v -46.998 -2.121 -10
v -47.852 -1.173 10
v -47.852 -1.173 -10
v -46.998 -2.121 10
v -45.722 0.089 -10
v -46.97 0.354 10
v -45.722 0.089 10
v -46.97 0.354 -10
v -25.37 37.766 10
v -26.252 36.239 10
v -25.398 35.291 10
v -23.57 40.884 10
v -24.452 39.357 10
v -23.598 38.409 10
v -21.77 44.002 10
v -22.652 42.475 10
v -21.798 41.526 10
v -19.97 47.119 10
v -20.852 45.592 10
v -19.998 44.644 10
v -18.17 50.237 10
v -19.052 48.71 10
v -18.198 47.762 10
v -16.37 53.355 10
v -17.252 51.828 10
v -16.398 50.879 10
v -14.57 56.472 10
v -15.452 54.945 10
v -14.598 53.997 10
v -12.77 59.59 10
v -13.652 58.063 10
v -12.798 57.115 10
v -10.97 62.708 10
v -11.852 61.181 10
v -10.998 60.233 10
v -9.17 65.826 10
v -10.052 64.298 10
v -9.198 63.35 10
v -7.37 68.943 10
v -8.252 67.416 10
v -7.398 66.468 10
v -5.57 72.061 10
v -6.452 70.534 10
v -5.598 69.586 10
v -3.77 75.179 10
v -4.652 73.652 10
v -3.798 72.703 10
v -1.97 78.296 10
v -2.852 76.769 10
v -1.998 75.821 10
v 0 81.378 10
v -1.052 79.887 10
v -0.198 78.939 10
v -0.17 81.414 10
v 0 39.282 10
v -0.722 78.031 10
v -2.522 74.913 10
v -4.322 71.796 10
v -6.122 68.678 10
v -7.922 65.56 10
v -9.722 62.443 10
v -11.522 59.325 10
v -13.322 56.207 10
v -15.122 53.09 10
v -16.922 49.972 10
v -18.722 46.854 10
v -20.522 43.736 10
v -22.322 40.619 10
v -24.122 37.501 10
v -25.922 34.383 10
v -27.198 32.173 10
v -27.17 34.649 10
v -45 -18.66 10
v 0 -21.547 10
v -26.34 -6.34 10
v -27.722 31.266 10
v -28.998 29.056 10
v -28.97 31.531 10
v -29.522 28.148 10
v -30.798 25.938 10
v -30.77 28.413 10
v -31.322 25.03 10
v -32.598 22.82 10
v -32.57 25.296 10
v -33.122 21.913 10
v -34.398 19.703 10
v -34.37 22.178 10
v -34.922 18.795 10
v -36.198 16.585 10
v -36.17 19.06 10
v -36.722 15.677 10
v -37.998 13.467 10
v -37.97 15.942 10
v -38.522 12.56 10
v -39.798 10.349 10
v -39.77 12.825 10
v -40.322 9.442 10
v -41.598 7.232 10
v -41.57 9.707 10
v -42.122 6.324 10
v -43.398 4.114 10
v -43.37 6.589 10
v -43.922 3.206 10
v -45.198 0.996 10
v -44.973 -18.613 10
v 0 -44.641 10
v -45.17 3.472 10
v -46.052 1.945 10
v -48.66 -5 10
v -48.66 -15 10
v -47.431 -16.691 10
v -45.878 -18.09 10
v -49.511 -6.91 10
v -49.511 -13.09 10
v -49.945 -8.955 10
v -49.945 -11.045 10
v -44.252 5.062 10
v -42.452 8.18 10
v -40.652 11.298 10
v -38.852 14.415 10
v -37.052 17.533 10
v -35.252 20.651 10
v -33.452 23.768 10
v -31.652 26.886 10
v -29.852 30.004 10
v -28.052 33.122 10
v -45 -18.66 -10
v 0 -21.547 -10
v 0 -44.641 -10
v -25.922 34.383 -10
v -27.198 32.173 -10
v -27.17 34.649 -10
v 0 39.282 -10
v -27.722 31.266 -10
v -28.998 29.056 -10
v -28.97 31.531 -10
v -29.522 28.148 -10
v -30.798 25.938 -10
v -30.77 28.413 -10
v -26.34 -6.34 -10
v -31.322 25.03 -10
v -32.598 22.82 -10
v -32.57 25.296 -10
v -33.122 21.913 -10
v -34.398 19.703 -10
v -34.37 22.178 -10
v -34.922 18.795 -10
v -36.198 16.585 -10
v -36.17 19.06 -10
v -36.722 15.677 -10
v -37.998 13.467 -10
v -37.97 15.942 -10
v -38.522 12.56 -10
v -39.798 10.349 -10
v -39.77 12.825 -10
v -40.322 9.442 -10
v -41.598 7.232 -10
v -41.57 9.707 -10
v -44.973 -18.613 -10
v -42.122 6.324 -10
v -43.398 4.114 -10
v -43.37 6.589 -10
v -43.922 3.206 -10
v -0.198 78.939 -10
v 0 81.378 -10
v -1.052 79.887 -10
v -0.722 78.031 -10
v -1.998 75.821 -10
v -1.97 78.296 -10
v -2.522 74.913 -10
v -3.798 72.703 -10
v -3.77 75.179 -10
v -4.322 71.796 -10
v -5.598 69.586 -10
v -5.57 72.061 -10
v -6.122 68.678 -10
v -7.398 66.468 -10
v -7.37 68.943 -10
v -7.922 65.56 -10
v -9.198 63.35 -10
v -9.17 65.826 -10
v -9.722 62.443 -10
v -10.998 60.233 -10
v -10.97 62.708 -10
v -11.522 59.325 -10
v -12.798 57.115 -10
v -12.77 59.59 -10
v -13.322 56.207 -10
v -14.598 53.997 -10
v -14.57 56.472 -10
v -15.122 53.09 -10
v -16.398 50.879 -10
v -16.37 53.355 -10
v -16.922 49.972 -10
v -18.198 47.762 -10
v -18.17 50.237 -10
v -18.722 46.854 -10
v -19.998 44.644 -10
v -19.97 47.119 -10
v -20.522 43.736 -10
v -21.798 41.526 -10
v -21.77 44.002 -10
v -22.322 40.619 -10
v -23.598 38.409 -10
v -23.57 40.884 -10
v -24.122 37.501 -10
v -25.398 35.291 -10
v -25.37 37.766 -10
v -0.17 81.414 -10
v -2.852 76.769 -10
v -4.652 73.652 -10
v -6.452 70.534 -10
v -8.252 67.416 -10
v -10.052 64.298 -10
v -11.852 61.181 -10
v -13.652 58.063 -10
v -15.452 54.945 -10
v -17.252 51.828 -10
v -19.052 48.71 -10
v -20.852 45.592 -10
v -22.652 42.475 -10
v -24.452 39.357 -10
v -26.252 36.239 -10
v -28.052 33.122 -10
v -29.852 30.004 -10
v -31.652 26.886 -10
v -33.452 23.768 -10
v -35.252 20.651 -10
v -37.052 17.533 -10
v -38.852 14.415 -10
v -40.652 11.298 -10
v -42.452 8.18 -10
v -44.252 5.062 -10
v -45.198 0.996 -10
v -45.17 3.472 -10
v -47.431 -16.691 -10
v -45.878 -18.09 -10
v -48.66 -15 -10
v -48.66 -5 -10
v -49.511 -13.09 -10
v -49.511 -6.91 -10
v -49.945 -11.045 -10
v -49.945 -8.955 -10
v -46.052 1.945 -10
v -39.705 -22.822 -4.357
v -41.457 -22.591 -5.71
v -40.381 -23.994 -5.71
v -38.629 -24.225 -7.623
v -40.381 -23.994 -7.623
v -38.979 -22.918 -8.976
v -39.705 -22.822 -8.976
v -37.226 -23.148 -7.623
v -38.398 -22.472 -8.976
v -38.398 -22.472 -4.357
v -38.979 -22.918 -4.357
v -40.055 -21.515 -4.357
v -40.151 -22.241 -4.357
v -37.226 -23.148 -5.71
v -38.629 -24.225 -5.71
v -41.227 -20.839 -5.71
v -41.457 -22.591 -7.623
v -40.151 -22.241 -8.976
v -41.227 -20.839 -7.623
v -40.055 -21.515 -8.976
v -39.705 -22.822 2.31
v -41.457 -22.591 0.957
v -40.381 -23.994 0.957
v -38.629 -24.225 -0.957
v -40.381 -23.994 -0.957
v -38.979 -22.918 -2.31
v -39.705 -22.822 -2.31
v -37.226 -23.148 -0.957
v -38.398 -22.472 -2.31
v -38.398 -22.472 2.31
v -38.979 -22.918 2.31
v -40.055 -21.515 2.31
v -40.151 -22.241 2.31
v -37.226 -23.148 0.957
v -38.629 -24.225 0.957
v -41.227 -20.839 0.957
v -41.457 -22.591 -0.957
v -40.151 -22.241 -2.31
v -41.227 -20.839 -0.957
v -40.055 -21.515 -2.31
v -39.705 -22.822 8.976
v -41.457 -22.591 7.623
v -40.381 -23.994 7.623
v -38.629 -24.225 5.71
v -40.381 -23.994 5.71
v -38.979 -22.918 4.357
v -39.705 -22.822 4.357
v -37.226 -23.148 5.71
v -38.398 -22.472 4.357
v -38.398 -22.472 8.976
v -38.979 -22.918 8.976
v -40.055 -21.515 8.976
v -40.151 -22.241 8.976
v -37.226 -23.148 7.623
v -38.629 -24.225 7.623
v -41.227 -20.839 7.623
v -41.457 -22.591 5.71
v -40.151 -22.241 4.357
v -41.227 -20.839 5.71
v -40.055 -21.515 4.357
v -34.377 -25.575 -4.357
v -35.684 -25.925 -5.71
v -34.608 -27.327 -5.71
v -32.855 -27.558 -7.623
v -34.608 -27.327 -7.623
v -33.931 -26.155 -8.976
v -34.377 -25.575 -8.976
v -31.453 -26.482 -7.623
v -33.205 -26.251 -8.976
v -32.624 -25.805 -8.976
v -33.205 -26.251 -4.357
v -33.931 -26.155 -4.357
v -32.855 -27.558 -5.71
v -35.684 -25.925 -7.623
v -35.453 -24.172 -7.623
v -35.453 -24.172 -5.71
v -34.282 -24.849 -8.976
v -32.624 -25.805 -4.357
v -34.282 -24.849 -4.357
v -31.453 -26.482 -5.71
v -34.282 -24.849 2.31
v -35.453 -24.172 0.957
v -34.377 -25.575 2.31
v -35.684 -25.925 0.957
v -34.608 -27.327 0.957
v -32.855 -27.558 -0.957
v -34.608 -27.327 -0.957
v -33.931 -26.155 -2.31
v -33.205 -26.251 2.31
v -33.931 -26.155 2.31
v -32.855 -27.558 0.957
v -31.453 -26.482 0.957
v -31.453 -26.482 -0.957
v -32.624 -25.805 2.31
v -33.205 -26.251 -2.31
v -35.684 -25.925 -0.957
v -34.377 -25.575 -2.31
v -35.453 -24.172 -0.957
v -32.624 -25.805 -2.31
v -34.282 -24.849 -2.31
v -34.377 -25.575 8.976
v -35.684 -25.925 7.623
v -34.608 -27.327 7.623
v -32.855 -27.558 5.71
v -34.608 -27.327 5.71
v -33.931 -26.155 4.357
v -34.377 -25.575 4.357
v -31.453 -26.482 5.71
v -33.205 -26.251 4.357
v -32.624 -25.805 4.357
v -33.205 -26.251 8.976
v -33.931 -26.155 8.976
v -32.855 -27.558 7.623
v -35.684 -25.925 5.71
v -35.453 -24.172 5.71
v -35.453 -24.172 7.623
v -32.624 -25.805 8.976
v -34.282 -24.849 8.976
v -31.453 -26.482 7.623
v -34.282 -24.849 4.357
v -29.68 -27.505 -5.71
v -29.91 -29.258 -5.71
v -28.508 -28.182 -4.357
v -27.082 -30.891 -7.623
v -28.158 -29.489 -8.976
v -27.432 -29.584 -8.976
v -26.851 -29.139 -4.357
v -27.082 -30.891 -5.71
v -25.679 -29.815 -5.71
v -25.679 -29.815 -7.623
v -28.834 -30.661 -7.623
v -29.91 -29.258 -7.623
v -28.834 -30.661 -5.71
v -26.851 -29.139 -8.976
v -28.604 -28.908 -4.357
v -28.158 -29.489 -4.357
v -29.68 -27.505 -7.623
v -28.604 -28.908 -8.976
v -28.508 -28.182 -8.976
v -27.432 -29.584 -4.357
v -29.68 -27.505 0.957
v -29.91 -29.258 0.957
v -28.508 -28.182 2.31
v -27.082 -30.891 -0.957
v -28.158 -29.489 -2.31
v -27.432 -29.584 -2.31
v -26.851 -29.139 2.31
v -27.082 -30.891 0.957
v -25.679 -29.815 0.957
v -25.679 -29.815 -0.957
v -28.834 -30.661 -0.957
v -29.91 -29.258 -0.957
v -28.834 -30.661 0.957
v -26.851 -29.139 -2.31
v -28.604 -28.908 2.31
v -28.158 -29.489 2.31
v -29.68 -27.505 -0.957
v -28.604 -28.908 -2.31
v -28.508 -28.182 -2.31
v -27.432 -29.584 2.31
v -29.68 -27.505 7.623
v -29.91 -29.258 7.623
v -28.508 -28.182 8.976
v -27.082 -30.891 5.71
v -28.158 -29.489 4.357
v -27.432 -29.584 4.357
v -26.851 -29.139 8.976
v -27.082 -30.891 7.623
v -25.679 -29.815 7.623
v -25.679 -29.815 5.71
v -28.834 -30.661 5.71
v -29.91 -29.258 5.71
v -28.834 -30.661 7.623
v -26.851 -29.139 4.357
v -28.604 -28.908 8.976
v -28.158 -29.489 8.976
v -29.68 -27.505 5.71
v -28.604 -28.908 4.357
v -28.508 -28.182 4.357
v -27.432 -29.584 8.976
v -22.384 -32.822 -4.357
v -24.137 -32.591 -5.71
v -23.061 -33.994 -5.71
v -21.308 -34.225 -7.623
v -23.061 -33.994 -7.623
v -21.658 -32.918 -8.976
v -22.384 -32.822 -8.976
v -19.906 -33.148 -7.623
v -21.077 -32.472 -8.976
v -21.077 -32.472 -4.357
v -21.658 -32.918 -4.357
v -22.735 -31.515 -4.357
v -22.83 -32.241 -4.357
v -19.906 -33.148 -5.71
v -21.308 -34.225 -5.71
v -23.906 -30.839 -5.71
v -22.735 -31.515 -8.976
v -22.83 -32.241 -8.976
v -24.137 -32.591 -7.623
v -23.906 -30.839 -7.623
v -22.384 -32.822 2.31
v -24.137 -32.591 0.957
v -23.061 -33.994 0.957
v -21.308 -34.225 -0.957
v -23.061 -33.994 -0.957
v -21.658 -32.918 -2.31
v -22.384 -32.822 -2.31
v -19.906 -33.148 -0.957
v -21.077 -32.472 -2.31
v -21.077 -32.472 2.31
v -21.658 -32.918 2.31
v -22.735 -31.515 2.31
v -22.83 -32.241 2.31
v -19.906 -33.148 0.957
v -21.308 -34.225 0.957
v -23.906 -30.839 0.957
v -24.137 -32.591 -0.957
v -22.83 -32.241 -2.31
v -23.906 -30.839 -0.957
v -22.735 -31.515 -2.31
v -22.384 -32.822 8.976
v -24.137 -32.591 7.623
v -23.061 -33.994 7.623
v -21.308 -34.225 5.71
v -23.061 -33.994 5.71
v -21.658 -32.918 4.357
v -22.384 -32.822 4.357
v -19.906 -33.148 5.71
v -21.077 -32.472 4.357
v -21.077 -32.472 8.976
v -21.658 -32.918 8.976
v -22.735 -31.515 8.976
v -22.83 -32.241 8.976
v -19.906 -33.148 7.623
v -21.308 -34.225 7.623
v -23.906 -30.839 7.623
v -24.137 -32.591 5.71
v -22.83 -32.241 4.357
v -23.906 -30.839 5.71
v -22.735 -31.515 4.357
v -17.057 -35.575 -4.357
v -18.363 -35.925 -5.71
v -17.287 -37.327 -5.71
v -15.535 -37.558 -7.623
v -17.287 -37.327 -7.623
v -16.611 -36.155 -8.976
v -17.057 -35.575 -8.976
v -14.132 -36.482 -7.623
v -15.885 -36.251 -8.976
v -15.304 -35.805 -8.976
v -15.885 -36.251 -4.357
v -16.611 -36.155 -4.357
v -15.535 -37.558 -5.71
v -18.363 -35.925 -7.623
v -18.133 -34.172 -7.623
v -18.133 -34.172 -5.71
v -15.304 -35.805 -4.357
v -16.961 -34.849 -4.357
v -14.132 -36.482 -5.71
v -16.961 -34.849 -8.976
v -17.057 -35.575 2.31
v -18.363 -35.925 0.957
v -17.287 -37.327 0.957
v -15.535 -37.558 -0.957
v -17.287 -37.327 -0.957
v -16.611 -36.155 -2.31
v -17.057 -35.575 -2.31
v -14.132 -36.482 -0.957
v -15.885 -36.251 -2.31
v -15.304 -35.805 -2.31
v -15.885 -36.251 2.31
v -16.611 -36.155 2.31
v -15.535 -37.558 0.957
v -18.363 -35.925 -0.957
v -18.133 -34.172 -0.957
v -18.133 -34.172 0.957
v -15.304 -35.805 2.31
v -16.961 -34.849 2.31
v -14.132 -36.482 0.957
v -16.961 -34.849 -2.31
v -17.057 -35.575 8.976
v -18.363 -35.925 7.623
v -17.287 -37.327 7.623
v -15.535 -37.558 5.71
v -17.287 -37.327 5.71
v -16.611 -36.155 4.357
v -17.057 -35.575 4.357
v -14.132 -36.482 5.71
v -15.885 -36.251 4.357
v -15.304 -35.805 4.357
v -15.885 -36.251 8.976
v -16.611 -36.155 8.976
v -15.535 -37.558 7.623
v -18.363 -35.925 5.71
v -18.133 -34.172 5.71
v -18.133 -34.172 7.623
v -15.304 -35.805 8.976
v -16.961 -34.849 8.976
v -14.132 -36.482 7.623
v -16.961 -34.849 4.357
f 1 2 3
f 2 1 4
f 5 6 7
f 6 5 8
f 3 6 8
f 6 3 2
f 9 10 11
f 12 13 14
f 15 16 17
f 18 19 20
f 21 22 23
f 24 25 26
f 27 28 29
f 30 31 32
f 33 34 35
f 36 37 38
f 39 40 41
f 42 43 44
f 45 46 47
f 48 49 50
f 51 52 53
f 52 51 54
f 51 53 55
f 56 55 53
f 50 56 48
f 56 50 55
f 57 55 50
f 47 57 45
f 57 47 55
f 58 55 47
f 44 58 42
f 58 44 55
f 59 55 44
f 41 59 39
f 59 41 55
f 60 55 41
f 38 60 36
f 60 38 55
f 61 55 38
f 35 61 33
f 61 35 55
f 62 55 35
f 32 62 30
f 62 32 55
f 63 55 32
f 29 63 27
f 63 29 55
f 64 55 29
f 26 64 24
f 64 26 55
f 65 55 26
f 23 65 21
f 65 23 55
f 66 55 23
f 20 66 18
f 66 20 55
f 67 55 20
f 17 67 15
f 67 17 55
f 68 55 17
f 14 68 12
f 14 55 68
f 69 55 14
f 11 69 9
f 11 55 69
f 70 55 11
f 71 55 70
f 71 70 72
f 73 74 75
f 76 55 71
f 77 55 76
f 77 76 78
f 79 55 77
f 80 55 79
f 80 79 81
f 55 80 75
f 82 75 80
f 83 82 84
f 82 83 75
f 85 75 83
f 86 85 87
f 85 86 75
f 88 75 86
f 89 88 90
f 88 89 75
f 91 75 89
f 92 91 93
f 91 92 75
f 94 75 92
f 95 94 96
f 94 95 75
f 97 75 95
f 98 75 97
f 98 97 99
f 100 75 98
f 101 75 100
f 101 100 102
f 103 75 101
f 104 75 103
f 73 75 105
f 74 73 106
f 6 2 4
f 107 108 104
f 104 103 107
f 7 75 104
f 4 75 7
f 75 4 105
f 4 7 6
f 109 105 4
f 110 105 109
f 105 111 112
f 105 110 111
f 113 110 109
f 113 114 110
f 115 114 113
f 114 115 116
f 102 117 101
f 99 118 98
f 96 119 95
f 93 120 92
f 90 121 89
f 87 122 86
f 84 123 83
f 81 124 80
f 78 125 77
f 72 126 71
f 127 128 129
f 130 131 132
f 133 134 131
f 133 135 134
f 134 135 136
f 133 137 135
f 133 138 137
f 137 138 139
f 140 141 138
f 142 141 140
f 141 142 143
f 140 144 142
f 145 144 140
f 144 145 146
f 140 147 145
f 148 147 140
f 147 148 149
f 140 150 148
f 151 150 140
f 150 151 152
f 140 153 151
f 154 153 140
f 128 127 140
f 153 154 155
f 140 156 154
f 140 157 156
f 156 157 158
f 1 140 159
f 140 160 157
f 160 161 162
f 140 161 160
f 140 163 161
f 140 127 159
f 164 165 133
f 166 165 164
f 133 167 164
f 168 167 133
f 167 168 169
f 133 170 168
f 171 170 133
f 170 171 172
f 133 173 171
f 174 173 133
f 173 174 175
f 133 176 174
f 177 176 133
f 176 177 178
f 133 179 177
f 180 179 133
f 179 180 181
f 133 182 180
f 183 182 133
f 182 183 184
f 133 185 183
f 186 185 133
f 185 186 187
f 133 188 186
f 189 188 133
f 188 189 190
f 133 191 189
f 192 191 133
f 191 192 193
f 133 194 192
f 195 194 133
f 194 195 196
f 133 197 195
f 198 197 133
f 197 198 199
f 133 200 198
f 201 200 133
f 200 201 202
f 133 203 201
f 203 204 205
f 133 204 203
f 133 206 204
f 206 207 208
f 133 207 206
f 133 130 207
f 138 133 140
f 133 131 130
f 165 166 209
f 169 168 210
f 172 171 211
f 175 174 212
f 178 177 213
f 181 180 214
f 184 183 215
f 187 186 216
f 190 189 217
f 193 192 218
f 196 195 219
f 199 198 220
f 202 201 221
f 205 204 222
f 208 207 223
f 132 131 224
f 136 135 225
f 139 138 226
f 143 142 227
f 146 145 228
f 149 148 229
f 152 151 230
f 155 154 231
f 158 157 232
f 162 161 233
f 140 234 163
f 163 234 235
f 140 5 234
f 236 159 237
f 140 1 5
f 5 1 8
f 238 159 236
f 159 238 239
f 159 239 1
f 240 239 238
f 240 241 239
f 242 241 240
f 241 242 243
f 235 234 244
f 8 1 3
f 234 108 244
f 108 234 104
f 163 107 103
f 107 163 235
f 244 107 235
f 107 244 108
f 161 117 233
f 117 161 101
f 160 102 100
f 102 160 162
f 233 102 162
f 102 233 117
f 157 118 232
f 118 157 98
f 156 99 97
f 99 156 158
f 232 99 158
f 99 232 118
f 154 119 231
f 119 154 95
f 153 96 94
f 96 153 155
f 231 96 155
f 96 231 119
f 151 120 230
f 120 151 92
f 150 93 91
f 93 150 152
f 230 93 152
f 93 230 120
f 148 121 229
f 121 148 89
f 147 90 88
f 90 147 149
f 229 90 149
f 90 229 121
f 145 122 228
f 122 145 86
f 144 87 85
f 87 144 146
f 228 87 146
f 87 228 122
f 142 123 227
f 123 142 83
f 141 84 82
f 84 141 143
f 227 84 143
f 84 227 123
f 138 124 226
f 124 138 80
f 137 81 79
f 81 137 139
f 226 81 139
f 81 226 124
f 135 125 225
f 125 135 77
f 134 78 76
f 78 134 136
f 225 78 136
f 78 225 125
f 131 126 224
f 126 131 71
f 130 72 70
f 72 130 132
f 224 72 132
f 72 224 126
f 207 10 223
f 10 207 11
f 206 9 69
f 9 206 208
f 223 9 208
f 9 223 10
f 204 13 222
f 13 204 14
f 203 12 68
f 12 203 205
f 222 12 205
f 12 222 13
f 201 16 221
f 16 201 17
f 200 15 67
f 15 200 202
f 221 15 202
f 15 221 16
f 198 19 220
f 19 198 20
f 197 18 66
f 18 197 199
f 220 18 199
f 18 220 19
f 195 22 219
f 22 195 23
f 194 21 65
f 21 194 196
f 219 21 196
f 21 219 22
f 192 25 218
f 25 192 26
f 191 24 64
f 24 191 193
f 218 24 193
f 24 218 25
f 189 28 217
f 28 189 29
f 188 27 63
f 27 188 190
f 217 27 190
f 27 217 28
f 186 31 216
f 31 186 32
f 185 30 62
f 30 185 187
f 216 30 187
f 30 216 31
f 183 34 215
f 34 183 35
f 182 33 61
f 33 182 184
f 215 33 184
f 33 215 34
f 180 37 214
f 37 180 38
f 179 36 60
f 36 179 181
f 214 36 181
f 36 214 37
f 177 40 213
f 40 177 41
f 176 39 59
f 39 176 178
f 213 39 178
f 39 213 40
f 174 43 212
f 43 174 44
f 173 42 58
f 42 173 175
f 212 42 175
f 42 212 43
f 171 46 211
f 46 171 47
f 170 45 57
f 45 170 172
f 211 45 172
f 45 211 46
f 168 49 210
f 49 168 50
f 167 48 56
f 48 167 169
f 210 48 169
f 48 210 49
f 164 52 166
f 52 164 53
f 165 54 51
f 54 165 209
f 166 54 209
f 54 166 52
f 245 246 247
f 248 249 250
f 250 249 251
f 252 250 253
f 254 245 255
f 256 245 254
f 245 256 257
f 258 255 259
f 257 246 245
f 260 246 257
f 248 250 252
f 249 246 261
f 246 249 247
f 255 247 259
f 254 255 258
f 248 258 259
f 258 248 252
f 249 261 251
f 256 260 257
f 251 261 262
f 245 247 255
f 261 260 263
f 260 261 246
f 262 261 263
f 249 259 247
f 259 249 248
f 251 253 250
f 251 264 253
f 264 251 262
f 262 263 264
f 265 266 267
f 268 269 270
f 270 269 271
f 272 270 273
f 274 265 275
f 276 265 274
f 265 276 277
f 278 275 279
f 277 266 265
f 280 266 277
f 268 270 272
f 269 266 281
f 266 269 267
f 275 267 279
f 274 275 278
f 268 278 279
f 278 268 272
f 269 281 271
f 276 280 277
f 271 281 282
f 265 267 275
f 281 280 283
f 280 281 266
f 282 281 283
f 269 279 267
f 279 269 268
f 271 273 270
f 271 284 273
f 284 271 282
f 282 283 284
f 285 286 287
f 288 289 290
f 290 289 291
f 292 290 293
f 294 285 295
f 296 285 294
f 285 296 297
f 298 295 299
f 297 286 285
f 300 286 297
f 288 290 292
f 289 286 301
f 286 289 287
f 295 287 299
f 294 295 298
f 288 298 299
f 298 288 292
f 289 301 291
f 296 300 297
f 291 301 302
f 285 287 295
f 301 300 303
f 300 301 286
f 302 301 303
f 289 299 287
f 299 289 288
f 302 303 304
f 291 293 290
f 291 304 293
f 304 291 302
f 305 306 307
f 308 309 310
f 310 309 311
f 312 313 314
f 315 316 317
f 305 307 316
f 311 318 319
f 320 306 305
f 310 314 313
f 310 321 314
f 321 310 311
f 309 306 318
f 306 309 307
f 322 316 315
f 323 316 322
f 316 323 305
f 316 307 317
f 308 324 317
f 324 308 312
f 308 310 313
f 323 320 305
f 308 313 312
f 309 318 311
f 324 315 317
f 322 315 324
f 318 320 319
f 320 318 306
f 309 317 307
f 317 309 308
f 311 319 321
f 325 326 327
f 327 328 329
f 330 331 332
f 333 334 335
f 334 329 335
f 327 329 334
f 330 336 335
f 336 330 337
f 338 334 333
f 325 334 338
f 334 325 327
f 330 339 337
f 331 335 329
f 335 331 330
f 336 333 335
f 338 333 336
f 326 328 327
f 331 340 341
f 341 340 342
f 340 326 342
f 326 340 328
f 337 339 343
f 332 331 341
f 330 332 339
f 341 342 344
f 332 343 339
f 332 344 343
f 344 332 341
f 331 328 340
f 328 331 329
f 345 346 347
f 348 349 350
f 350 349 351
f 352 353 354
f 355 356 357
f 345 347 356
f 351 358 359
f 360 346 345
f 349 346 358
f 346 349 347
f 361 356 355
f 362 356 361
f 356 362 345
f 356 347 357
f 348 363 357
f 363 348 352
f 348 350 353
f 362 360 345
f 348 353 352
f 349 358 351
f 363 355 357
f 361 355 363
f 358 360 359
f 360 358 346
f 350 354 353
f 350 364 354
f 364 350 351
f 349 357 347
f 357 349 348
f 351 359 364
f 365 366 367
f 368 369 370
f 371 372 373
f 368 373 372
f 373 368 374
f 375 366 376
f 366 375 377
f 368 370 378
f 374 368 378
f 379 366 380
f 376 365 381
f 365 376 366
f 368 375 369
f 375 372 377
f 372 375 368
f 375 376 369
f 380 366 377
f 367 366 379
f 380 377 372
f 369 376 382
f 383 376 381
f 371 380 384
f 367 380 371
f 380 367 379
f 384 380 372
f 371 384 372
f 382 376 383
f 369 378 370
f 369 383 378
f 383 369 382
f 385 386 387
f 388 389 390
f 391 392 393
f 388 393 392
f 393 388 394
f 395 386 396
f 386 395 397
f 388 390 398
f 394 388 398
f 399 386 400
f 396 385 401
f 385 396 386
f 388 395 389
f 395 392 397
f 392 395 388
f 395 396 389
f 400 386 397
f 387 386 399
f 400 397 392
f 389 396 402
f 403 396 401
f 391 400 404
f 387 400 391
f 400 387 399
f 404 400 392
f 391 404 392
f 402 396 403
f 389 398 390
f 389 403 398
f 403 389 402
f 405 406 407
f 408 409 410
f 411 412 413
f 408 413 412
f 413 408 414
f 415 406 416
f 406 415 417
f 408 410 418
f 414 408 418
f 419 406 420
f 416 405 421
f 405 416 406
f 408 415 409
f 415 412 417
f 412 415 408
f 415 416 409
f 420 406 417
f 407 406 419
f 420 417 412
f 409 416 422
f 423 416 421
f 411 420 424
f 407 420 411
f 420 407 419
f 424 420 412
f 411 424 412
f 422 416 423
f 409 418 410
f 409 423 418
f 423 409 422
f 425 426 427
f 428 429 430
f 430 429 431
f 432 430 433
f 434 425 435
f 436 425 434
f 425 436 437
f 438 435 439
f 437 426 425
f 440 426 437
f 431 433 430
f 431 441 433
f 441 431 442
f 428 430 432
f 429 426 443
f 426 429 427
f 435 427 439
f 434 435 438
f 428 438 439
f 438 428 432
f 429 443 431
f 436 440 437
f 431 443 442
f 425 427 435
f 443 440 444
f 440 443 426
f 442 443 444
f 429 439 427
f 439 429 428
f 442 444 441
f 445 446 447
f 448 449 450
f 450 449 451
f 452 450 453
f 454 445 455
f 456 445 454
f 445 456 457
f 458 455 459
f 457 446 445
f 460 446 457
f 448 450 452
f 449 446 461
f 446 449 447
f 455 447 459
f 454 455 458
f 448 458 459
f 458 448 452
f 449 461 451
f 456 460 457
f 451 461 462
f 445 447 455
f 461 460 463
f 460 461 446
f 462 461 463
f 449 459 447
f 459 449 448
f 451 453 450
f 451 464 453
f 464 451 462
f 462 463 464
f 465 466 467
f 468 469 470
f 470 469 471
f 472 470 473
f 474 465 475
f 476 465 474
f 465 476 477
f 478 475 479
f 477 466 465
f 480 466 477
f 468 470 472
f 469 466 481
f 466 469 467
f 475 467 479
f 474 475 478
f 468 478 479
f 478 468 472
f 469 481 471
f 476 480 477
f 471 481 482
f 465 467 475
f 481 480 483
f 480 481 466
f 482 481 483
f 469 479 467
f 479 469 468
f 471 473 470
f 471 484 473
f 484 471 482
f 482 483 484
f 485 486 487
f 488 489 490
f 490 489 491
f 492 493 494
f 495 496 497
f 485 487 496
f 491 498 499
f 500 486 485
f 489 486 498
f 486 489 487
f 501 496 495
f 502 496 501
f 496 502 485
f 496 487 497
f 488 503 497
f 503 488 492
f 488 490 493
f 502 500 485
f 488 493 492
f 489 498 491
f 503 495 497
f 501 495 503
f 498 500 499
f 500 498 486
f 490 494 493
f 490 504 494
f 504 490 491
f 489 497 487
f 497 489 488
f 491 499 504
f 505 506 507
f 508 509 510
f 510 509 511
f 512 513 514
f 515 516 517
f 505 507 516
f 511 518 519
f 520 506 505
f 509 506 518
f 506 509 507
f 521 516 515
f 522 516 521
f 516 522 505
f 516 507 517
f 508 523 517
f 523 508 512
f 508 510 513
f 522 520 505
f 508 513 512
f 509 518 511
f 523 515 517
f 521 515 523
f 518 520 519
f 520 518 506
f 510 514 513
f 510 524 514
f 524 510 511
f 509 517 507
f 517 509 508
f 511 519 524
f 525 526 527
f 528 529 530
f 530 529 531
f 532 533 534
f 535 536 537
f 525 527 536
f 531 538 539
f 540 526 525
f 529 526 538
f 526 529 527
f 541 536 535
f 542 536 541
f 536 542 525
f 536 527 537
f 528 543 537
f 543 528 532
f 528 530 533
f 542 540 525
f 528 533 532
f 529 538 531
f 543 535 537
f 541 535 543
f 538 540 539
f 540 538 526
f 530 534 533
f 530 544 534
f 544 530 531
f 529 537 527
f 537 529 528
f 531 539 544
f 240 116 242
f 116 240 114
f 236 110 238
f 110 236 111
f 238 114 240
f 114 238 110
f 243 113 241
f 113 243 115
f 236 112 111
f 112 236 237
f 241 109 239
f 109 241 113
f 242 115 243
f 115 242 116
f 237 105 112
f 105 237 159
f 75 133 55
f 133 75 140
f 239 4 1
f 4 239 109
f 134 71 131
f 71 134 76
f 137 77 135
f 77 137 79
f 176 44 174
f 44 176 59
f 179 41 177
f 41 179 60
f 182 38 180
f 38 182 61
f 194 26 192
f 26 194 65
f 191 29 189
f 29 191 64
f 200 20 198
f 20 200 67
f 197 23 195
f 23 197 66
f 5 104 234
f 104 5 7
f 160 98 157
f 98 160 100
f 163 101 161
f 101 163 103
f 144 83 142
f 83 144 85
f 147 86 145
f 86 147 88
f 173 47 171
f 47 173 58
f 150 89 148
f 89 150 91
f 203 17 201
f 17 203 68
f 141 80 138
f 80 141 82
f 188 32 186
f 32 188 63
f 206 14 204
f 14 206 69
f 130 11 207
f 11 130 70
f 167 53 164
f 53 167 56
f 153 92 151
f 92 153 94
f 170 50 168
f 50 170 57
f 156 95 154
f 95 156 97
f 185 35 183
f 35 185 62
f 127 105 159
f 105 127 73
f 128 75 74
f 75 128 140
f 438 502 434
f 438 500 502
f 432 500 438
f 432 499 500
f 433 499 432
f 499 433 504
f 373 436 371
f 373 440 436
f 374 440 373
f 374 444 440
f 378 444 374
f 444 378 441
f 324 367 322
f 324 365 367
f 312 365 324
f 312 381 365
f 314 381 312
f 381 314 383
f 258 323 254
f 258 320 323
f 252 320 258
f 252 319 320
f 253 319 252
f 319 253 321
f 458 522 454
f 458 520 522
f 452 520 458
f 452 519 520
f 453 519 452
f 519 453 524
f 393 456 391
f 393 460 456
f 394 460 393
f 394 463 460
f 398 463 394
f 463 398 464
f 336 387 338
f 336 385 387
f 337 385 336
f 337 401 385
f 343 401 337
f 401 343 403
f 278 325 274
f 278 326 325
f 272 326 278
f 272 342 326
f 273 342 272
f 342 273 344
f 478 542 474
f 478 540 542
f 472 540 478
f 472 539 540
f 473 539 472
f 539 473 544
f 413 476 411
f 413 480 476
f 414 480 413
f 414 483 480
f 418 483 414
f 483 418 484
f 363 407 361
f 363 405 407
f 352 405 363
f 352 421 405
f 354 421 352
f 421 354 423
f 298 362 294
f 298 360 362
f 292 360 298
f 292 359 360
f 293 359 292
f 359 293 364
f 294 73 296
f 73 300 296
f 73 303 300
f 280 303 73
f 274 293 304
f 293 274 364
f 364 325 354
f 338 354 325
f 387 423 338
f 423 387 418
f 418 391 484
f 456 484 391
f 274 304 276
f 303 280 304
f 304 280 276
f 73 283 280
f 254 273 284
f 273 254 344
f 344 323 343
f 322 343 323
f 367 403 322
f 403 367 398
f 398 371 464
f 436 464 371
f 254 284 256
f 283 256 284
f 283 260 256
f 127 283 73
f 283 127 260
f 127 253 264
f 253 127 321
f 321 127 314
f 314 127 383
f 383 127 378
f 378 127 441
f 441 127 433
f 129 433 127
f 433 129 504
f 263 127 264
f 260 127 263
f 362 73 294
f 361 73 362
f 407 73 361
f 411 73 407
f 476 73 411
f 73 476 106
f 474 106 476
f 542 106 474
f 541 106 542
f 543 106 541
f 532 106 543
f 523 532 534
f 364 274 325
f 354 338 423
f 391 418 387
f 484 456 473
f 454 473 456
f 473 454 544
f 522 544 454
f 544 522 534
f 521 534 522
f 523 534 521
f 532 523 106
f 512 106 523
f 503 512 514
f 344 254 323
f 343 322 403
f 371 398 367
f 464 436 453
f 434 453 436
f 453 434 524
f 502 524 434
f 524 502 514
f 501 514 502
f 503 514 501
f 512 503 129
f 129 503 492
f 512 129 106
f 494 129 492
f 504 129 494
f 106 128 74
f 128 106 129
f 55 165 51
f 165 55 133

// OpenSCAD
widgetWidth = 20; // [15:40]
widgetThickness = 20; // [15:50]
widgetHeight = 50; // [40:70]
stepSize = 3; // [2:5]

module theL(theWidth, theThickness, theHeight, theStep) {
  cylinder(h=theWidth, r=theThickness/2, center=true);
  translate(v=[0, 80, 0]) cube(size=[theThickness, 160, theWidth], center=true);  // long side
  translate(v=[60, 0, 0]) cube(size=[120, theThickness, theWidth], center=true);   // short side

  for (i = [1:55]) {
    translate(v=[-1*theThickness/2, i*theStep*1.2+1, 0]) cylinder(h=theWidth, r=theStep/2, center=true);
  }

  for (i = [1:5]) {
    translate(v=[i*theWidth/3, -1*theThickness/2, -1*theWidth/3]) sphere(r = theWidth/8);
    translate(v=[i*theWidth/3, -1*theThickness/2, 0]) sphere(r = theWidth/8);
    translate(v=[i*theWidth/3, -1*theThickness/2, 1*theWidth/3]) sphere(r = theWidth/8);
  }
}

 
difference() {
  translate(v=[widgetThickness/2-widgetHeight, -0.5*widgetThickness, 0]) rotate([0, 0, -30]) theL(widgetWidth, widgetThickness, widgetHeight, stepSize);
  translate(v=[200, 50, 0]) cube(size=[400, 800, 100], center=true);
}


// preview[view:south west, tilt:top diagonal]
